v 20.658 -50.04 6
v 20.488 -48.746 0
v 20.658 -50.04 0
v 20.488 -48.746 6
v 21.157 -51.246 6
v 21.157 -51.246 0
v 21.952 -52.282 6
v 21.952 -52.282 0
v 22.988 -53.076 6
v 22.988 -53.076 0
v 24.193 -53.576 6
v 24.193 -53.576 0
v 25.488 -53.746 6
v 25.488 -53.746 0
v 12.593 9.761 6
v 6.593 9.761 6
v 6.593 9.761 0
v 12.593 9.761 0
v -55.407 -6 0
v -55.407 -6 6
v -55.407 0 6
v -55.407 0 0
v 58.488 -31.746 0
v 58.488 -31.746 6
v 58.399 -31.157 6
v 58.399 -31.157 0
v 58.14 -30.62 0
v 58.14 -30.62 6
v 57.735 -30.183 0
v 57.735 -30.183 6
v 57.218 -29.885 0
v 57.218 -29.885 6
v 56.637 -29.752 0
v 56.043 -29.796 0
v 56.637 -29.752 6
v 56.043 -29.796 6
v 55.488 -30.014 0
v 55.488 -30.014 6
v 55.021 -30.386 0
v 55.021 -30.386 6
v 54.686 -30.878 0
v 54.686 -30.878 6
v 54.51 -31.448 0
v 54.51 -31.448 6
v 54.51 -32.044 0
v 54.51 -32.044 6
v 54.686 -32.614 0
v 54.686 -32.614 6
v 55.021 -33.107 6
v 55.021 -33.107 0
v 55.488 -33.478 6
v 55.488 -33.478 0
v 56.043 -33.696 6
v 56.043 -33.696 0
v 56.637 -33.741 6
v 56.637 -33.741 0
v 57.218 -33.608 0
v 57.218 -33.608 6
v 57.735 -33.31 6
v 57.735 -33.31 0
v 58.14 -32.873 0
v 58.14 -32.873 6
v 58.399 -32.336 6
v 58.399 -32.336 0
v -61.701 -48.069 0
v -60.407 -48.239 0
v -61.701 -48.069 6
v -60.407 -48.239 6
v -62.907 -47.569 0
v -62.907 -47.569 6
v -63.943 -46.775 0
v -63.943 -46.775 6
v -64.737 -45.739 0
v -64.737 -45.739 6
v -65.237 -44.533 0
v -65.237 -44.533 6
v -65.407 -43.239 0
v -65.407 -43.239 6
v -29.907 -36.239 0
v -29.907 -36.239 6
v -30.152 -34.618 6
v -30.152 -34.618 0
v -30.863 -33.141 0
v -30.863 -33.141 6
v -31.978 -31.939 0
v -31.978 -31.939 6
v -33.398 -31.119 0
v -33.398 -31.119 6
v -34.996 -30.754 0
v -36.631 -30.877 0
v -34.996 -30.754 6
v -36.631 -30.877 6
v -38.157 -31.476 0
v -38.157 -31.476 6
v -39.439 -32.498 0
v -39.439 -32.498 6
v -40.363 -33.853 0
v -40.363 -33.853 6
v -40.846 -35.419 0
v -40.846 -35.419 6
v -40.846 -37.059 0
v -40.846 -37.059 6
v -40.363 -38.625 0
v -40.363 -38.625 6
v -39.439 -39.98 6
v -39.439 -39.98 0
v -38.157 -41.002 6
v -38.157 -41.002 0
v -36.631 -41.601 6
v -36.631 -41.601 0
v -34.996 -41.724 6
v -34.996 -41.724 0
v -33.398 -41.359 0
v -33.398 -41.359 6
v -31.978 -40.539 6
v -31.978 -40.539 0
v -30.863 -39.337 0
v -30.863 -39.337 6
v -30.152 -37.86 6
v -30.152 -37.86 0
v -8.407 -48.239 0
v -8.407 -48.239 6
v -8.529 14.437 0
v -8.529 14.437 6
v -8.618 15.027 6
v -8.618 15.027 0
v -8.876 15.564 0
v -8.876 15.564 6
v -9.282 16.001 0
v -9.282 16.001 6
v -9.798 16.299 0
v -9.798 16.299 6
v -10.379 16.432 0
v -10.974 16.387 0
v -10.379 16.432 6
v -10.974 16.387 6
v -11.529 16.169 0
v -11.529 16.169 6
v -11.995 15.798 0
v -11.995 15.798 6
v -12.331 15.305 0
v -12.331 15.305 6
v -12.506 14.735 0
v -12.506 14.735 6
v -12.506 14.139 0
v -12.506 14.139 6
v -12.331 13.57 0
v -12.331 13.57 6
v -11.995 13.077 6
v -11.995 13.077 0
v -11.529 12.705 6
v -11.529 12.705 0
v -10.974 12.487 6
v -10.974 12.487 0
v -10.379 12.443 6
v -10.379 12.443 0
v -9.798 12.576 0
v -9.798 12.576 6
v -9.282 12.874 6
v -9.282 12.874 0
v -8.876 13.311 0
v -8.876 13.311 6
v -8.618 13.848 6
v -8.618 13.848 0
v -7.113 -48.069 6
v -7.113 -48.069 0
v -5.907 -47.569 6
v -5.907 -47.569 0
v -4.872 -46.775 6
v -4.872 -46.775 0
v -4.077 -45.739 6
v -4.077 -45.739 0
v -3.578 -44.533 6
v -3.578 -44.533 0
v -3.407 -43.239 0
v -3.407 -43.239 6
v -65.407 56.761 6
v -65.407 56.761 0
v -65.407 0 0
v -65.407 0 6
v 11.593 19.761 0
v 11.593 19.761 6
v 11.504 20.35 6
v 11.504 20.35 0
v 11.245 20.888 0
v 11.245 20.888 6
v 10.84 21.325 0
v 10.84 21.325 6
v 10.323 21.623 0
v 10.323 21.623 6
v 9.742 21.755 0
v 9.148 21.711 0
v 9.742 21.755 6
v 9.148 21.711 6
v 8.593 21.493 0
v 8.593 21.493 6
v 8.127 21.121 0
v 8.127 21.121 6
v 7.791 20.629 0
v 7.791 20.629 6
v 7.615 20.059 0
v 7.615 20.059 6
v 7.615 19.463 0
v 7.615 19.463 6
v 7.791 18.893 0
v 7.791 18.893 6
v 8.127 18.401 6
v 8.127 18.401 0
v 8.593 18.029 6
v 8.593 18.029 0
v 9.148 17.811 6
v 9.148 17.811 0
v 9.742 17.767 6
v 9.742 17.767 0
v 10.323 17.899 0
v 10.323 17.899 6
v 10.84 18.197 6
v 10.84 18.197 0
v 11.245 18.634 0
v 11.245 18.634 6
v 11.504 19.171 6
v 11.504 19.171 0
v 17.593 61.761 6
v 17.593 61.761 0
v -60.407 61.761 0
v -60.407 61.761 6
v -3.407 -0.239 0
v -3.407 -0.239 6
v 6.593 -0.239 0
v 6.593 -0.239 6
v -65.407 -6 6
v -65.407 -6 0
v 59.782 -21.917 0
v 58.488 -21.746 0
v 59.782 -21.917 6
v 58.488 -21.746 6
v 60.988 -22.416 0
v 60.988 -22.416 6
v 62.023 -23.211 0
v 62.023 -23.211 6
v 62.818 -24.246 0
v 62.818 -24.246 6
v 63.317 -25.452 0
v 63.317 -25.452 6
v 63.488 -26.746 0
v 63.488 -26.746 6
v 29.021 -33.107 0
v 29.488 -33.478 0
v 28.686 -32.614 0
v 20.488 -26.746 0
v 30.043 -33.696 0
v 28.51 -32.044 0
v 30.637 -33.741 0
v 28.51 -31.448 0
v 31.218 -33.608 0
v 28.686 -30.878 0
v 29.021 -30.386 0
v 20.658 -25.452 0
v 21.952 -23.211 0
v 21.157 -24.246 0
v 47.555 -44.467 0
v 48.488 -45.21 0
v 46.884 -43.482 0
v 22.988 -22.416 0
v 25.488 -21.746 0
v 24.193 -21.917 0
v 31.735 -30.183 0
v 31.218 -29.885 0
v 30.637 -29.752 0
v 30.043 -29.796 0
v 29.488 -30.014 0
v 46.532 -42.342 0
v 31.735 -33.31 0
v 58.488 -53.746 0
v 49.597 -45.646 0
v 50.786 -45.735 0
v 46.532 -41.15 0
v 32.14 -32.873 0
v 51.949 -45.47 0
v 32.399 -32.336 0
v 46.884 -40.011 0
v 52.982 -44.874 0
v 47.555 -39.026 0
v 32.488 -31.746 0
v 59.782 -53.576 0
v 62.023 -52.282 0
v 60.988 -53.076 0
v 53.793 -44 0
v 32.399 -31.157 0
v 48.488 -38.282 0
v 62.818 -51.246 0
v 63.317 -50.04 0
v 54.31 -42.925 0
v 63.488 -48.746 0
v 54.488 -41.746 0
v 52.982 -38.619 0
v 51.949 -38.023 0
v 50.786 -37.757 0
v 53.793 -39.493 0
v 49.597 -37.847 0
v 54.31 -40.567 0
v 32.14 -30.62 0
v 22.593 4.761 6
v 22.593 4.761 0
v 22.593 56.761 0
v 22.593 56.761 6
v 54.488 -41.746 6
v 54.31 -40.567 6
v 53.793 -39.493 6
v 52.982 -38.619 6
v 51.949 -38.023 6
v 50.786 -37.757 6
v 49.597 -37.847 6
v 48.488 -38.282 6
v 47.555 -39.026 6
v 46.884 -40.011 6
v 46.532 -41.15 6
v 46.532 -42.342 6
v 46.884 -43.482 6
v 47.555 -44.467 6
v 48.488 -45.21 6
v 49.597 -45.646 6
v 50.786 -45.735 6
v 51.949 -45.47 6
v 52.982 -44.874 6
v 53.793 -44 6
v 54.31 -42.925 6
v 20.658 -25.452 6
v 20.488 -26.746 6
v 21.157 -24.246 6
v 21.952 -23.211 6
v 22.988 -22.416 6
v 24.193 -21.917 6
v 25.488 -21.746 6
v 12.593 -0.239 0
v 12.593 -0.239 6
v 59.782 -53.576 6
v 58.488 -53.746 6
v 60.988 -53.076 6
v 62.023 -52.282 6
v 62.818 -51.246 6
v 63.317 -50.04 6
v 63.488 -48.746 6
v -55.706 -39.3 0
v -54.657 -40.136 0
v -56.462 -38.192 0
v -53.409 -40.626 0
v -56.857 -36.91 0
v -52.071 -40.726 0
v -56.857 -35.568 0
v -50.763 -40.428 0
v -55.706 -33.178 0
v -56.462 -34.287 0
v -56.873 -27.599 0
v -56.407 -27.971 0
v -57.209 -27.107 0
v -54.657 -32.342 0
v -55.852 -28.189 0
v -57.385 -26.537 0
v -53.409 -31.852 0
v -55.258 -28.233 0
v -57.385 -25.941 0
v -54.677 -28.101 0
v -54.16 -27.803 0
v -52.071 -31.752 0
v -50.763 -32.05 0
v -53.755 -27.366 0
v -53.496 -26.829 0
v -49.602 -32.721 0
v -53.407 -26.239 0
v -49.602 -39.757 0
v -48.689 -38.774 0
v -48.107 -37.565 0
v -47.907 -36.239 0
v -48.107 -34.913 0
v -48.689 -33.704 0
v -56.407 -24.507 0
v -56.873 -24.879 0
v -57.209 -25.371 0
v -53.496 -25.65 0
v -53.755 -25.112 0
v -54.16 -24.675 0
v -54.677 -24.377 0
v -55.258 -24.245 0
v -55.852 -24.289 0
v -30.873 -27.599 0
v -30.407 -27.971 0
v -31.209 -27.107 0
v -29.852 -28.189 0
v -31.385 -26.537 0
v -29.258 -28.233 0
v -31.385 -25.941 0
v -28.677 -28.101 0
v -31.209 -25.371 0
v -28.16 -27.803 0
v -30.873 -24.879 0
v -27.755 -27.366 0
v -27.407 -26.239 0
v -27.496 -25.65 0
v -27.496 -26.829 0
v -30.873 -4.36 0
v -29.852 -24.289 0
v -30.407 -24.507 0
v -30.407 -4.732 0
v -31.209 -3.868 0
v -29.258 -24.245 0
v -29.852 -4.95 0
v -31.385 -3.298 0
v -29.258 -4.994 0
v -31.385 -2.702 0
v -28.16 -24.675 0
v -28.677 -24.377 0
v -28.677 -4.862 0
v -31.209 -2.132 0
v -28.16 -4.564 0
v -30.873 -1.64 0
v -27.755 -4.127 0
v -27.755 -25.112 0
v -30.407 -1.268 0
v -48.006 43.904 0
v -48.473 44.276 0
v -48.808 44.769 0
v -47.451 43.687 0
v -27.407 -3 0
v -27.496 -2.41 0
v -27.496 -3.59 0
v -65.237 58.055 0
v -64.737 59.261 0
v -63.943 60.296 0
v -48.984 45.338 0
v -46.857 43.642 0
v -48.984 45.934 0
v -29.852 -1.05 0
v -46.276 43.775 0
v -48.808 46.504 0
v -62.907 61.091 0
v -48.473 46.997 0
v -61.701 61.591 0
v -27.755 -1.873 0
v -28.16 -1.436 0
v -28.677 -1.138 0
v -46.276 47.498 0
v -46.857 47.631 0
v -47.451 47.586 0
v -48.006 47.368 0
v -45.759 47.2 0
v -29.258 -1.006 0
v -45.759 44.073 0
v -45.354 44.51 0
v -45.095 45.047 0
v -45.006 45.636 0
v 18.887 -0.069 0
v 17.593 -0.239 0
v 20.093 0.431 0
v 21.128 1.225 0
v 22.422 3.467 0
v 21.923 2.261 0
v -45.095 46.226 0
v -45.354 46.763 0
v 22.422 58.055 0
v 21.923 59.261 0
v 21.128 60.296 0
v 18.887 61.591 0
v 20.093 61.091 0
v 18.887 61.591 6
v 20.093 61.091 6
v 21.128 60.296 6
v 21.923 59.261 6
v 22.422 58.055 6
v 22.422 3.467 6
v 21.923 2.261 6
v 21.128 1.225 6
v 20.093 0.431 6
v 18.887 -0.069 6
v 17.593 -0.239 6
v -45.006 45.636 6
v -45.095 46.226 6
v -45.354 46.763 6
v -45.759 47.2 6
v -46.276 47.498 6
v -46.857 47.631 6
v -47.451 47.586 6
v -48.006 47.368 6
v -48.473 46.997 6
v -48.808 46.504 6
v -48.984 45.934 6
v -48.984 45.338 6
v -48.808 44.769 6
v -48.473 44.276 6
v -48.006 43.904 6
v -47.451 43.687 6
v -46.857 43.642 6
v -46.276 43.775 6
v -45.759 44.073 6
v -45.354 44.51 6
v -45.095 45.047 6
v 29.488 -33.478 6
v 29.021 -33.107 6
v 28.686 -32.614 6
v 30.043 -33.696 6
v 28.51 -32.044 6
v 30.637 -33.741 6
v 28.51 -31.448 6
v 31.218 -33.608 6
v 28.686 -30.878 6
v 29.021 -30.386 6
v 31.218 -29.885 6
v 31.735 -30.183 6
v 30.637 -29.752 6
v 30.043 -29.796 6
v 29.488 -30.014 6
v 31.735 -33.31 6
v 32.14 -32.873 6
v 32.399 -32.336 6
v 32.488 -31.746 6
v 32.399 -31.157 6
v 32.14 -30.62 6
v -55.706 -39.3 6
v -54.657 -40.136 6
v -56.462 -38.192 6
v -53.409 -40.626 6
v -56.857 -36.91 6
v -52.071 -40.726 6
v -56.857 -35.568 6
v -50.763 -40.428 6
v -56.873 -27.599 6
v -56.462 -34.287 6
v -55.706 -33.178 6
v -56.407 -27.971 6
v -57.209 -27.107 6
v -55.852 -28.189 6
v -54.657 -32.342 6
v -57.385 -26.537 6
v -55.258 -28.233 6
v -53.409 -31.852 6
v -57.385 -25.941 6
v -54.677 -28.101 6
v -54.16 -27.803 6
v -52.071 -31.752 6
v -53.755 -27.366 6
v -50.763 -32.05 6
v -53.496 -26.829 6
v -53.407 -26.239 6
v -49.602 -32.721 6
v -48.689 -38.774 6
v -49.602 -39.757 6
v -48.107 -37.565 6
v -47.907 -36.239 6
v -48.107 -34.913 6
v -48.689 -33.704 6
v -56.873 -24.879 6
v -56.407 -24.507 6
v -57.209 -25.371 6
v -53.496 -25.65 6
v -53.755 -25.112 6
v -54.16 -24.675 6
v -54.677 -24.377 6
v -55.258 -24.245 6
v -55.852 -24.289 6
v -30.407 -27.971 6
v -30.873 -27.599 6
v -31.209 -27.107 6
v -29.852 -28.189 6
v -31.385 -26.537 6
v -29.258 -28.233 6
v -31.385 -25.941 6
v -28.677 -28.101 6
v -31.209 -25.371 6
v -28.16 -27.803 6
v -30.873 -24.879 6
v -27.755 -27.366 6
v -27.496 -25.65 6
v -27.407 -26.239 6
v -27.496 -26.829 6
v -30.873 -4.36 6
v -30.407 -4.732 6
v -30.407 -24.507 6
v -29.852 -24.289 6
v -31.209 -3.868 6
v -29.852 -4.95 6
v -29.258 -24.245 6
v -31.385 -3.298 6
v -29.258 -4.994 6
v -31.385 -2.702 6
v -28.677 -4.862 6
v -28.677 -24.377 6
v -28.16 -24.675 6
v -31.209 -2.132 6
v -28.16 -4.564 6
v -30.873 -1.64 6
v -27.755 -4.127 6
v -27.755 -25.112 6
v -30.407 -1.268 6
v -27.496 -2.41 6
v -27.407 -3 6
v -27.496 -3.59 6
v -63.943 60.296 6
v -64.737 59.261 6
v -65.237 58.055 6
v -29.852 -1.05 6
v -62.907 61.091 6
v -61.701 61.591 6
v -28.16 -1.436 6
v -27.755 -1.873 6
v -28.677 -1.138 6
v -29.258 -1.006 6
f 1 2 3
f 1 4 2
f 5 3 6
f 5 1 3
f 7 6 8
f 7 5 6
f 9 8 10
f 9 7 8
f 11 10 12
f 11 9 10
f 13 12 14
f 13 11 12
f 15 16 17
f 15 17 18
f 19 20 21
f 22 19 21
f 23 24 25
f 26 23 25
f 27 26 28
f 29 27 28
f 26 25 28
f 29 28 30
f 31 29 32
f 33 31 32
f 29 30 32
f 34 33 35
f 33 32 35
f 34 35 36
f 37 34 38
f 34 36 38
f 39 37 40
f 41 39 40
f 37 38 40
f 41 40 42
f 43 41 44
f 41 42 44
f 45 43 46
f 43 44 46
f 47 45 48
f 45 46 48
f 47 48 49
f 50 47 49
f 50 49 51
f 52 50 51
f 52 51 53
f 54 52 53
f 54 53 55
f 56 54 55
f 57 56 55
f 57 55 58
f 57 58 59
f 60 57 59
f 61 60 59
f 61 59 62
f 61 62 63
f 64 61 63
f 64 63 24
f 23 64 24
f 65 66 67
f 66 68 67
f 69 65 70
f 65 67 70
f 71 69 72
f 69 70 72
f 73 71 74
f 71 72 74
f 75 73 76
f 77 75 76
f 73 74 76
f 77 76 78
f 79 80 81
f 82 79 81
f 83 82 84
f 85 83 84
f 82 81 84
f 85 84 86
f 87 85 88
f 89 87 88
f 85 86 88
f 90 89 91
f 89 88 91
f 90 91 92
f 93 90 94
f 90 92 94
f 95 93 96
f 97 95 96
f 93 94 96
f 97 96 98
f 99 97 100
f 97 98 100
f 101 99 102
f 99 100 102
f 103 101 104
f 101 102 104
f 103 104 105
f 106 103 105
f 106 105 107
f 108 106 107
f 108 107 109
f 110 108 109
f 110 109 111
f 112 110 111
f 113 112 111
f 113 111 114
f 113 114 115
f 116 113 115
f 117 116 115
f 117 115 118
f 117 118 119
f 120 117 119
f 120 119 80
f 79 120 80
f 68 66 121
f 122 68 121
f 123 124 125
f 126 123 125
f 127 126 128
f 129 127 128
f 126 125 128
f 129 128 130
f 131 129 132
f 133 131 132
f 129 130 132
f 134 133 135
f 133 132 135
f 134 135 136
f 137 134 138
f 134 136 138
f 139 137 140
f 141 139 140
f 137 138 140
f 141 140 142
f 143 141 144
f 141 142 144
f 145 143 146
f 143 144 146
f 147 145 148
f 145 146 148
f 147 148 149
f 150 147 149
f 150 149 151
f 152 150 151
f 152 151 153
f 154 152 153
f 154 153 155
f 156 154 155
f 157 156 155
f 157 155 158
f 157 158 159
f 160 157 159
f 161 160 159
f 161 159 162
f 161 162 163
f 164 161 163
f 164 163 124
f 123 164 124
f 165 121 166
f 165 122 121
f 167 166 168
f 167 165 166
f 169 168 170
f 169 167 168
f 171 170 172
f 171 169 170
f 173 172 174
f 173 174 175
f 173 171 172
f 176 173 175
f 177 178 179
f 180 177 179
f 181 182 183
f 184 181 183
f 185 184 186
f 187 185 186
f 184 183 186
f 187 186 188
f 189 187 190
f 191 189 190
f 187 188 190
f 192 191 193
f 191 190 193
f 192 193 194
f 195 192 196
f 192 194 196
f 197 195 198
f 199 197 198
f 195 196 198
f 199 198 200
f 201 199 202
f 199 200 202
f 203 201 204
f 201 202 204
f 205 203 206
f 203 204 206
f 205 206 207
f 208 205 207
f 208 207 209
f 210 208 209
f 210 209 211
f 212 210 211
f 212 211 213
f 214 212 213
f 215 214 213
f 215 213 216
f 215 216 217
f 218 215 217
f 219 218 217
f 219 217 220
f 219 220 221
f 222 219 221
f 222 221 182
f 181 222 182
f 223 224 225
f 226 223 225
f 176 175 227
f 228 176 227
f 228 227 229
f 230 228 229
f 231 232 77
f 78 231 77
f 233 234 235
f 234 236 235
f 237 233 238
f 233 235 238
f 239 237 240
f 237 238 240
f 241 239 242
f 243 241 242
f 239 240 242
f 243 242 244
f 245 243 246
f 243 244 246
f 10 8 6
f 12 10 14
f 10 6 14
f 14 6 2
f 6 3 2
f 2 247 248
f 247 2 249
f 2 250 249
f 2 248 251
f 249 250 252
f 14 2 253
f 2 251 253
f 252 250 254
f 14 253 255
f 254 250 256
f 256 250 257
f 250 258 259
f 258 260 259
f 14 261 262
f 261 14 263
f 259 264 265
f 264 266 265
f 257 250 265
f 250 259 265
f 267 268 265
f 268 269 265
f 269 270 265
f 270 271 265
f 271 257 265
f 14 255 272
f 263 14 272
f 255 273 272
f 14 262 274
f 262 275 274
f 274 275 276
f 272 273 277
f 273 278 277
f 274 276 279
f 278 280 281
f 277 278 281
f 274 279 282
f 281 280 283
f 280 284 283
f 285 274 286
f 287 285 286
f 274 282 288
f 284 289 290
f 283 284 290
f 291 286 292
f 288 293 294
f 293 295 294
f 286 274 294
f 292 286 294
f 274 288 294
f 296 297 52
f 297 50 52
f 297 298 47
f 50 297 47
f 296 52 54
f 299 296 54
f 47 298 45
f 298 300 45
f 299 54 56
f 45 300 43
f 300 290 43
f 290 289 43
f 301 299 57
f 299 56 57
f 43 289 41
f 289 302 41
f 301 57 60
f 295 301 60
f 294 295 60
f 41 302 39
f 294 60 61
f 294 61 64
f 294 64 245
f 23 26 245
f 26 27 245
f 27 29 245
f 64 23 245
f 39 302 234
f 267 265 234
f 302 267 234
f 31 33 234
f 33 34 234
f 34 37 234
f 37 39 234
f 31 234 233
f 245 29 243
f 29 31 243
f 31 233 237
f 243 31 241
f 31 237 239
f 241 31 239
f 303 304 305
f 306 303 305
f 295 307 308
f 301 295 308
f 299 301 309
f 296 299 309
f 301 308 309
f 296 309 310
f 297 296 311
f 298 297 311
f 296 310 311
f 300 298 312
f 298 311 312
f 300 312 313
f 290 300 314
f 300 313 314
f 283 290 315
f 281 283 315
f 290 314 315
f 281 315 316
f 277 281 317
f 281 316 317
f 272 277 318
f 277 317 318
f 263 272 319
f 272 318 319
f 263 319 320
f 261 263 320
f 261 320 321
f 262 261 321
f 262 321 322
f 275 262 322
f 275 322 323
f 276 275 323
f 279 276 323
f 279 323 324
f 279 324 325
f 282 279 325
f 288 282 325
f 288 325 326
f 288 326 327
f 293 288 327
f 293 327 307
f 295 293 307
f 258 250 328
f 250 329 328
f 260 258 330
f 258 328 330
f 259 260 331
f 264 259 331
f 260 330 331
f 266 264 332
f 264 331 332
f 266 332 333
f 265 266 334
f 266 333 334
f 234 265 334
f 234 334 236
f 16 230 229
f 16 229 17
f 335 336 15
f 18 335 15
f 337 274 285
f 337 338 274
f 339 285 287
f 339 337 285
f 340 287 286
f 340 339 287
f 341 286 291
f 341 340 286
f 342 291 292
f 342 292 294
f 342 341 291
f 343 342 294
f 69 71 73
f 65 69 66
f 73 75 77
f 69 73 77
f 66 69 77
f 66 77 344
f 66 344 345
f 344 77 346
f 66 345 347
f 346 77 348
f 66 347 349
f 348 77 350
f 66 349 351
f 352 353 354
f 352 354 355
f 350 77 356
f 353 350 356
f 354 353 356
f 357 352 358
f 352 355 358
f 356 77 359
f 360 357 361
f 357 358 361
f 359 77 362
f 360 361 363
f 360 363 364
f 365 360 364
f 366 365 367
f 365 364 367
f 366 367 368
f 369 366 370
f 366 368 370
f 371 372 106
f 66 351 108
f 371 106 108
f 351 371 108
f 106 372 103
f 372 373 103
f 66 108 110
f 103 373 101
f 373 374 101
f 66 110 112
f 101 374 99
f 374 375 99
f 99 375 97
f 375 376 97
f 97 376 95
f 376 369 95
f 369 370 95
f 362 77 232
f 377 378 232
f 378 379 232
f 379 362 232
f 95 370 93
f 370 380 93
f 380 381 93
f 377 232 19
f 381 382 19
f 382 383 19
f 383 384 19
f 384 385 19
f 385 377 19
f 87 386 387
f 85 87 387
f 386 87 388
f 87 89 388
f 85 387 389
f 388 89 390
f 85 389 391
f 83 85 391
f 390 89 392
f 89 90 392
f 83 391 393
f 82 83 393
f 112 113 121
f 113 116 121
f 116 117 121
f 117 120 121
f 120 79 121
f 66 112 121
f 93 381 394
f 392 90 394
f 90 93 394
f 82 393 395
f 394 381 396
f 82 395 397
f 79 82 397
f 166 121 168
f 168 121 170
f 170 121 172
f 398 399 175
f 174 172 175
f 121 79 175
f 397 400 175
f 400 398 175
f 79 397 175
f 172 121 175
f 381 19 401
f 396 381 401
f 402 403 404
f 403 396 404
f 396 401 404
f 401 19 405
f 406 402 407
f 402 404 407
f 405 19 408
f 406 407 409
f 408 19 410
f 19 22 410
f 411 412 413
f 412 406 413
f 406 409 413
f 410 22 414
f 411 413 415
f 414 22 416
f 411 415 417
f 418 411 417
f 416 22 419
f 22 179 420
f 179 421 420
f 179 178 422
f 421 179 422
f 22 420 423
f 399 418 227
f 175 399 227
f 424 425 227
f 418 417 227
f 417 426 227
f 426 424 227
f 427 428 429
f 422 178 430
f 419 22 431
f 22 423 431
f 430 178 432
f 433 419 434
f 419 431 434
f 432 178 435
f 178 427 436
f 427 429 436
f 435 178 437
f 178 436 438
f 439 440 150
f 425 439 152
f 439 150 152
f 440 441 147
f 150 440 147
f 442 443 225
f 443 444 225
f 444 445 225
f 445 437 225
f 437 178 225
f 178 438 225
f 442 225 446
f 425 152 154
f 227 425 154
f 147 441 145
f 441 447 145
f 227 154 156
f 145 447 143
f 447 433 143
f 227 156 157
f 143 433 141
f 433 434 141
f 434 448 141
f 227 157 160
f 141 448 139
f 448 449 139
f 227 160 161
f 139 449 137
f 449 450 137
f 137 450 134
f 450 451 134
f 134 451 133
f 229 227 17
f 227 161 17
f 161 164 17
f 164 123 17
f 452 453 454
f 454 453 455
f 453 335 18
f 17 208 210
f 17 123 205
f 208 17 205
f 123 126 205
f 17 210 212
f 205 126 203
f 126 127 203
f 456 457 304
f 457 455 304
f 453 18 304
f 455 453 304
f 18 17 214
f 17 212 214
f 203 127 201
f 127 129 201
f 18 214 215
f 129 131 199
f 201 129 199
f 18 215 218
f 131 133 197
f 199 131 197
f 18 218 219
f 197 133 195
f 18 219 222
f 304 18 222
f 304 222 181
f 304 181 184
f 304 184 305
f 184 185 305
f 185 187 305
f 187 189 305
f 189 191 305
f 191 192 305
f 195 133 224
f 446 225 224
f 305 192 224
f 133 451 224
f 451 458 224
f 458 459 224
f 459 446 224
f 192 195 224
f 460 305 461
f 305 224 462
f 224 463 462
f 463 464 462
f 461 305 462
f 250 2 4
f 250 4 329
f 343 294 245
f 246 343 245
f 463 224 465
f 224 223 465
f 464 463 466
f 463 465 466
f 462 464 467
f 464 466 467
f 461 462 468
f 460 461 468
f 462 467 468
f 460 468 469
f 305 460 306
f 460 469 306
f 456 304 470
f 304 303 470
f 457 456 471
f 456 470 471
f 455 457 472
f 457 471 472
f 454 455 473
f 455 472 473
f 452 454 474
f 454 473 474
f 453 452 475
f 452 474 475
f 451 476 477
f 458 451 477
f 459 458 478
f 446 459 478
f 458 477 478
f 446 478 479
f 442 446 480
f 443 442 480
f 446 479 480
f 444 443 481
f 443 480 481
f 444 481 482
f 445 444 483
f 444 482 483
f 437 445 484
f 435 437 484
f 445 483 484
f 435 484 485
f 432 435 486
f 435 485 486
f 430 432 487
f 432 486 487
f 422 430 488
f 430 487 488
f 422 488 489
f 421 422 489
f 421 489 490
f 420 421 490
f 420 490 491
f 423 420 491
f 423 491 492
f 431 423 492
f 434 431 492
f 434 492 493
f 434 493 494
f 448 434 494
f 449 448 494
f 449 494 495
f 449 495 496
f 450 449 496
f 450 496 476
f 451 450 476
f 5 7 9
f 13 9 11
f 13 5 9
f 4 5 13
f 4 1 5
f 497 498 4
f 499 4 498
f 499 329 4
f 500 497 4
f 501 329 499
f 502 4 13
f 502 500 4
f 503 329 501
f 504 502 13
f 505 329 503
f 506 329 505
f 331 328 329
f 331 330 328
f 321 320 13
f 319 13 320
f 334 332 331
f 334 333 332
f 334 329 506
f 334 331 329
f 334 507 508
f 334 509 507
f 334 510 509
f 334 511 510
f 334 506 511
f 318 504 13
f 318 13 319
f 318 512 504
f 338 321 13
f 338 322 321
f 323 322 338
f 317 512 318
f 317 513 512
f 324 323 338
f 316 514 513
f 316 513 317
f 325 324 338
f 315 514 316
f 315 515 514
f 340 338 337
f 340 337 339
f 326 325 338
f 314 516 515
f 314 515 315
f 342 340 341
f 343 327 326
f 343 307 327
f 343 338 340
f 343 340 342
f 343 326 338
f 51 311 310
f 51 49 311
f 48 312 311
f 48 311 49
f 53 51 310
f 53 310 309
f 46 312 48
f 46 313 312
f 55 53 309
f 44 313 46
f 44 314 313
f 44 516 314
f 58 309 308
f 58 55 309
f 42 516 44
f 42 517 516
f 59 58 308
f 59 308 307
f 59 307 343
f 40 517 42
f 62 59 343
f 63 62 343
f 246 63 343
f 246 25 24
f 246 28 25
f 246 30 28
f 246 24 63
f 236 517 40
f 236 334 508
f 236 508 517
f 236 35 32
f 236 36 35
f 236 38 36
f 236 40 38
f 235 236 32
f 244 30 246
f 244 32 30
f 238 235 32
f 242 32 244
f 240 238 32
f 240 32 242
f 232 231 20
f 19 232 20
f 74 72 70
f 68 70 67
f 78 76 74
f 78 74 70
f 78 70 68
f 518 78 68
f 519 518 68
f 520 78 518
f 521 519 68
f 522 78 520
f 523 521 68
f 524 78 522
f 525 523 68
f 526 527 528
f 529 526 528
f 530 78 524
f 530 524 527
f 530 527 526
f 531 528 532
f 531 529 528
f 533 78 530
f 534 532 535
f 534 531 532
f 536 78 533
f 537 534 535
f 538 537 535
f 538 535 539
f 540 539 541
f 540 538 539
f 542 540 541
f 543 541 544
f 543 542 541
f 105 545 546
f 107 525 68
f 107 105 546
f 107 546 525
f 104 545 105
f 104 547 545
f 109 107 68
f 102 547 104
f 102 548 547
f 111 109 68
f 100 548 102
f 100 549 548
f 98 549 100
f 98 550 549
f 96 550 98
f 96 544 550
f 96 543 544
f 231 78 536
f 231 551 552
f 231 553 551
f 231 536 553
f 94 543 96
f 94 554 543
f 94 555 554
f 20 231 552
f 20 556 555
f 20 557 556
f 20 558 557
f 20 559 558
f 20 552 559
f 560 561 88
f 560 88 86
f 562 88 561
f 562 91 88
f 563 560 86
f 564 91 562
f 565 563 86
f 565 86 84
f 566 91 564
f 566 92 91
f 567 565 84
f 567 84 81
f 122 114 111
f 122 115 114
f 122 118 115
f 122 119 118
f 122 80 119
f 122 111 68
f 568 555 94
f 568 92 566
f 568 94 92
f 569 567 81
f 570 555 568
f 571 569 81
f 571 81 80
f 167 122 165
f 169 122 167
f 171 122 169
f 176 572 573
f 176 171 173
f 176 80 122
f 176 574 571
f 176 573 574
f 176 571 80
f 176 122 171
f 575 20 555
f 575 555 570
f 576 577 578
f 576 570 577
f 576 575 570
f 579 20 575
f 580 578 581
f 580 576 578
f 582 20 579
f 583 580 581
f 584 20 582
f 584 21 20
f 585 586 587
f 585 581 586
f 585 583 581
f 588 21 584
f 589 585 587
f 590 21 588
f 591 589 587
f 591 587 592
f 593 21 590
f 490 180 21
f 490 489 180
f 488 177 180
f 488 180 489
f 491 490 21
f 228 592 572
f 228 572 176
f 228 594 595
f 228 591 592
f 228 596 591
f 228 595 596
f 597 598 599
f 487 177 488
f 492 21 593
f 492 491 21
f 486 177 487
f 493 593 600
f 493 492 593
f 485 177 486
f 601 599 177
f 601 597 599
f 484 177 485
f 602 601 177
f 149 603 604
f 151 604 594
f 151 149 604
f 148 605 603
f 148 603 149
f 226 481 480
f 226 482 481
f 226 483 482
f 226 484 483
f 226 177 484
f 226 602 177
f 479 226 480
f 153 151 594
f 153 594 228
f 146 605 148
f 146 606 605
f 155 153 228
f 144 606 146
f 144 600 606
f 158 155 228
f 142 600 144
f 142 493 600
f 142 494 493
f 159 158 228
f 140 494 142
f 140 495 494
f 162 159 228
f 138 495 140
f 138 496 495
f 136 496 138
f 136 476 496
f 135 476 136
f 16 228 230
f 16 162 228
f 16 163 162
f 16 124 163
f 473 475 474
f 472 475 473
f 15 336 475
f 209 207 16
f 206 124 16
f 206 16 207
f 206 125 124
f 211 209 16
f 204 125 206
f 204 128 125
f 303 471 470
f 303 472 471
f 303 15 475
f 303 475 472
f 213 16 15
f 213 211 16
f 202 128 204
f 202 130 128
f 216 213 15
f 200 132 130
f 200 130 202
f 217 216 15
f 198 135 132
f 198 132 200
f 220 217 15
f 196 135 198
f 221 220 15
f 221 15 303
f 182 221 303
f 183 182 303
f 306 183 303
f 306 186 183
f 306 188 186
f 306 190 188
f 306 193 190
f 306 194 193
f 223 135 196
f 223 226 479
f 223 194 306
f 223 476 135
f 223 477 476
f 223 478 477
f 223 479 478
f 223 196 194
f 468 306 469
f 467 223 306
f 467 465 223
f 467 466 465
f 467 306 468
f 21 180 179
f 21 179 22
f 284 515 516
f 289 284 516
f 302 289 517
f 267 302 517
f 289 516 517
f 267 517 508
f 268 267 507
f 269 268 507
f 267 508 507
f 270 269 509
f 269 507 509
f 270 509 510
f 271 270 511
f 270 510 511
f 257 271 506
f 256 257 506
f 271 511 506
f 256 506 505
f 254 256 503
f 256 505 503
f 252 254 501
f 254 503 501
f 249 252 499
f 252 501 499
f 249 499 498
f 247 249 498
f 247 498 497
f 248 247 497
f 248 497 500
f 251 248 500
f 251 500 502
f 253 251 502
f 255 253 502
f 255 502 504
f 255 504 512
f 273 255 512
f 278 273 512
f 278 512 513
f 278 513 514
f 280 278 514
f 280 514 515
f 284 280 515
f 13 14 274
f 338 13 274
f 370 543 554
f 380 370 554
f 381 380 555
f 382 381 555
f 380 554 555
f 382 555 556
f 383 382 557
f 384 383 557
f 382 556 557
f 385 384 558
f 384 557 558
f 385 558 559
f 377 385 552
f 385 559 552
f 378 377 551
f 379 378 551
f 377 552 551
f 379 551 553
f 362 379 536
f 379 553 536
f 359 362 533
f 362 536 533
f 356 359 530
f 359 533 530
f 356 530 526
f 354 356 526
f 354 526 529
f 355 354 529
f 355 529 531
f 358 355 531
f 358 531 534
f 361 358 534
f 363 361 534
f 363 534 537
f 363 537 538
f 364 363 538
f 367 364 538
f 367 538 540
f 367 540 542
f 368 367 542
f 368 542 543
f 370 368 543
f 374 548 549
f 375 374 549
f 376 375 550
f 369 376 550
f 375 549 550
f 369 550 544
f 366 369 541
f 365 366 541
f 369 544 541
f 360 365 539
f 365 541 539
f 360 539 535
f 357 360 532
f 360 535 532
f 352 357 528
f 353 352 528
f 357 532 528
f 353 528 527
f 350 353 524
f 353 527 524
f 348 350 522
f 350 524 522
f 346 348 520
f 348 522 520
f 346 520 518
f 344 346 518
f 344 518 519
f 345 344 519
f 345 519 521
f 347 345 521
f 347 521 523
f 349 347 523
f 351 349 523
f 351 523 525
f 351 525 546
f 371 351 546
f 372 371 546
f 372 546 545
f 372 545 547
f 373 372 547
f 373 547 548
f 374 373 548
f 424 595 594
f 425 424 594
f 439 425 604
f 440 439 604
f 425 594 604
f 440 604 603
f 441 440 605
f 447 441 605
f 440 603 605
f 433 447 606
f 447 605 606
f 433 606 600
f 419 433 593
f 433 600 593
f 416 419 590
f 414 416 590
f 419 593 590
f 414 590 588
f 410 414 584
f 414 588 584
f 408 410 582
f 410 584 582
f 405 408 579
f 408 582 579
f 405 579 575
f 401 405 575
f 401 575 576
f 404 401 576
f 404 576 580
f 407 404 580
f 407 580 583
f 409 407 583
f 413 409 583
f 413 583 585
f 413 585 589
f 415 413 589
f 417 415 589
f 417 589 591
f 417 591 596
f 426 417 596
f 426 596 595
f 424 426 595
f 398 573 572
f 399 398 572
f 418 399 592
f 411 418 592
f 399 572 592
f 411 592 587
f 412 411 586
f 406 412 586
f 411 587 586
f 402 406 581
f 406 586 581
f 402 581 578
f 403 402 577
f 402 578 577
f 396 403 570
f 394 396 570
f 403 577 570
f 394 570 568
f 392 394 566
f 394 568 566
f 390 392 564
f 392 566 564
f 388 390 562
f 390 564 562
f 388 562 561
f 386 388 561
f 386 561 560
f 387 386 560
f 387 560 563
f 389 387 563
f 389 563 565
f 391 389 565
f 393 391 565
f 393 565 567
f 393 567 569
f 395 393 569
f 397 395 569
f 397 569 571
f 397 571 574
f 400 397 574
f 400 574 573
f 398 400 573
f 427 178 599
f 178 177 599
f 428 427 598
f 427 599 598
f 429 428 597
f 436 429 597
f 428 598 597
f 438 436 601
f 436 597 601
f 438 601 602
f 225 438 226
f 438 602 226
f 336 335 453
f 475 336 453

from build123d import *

# Parameters (mm, degrees)
F0_W      = 26
F0_H      = 62
F1_DEPTH  = 6
F2_W      = 10
F2_H      = 6
F2_W_2    = 6
F2_H_2    = 10
F3_DEPTH  = 25
F4_R      = 4.5
F4_R_2    = 5.5
F4_R_3    = 2
F5_DEPTH  = 25
F6_R      = 5
F7_R      = 2
F8_DEPTH  = 25
F9_W      = 43
F9_H      = 32
F10_DEPTH = 6
F11_R     = 2
F11_R_2   = 4
F12_DEPTH = 25
F13_R     = 5
F14_R     = 2
F15_DEPTH = 25


with BuildPart() as f1:
    # F0 (on Top) → F1 (new body)
    with BuildSketch(Plane.XY):
        Polygon((-65.407285, -48.239041), (-3.407285, -48.239041), (-3.407285, -0.239041), (-3.407285, 61.760959), (-65.407285, 61.760959), align=None)
        with Locations((9.592715, 30.760959)):
            Rectangle(F0_W, F0_H)
    extrude(amount=F1_DEPTH)

    # F2 (on face) → F3 (cut)
    with BuildSketch(Plane.XY.offset(6)):
        with Locations((-60.407285, -3)):
            Rectangle(F2_W, F2_H)
        with Locations((9.592715, 4.760959)):
            Rectangle(F2_W_2, F2_H_2)
    extrude(amount=-F3_DEPTH, mode=Mode.SUBTRACT)

    # F4 (on face) → F5 (cut)
    with BuildSketch(Plane.XY.offset(6)):
        with Locations((-52.407285, -36.239041)):
            Circle(F4_R)
        with Locations((-35.407285, -36.239041)):
            Circle(F4_R_2)
        with Locations((-29.407285, -3)):
            Circle(F4_R_3)
        with Locations((9.592715, 19.760959)):
            Circle(F4_R_3)
    extrude(amount=-F5_DEPTH, mode=Mode.SUBTRACT)

    # F6
    f6_edges = [f1.edges().sort_by_distance(p)[0] for p in [
        (-65.407285, -48.239041, 3),
        (-3.407285, -48.239041, 3),
        (22.592715, -0.239041, 3),
        (22.592715, 61.760959, 3),
        (-65.407285, 61.760959, 3),
    ]]
    fillet(f6_edges, radius=F6_R)

    # F7 (on face) → F8 (cut)
    with BuildSketch(Plane.XY.offset(6)):
        with Locations((-55.407285, -26.239041)):
            Circle(F7_R)
        with Locations((-29.407285, -26.239041)):
            Circle(F7_R)
    extrude(amount=-F8_DEPTH, mode=Mode.SUBTRACT)

    # F14 (on face) → F15 (cut)
    with BuildSketch(Plane.XY.offset(6)):
        with Locations((-47.006437, 45.636379)):
            Circle(F14_R)
        with Locations((-10.528787, 14.437323)):
            Circle(F14_R)
    extrude(amount=-F15_DEPTH, mode=Mode.SUBTRACT)


with BuildPart() as f10:
    # F9 (on Top) → F10 (new body)
    with BuildSketch(Plane.XY):
        with Locations((41.987561, -37.74626)):
            Rectangle(F9_W, F9_H)
    extrude(amount=F10_DEPTH)

    # F11 (on face) → F12 (cut)
    with BuildSketch(Plane.XY.offset(6)):
        with Locations((30.487561, -31.74626)):
            Circle(F11_R)
        with Locations((50.487561, -41.74626)):
            Circle(F11_R_2)
        with Locations((56.487561, -31.74626)):
            Circle(F11_R)
    extrude(amount=-F12_DEPTH, mode=Mode.SUBTRACT)

    # F13
    f13_edges = [f10.edges().sort_by_distance(p)[0] for p in [
        (20.487561, -53.74626, 3),
        (63.487561, -53.74626, 3),
        (63.487561, -21.74626, 3),
        (20.487561, -21.74626, 3),
    ]]
    fillet(f13_edges, radius=F13_R)


solid = Compound([f1.part, f10.part])
